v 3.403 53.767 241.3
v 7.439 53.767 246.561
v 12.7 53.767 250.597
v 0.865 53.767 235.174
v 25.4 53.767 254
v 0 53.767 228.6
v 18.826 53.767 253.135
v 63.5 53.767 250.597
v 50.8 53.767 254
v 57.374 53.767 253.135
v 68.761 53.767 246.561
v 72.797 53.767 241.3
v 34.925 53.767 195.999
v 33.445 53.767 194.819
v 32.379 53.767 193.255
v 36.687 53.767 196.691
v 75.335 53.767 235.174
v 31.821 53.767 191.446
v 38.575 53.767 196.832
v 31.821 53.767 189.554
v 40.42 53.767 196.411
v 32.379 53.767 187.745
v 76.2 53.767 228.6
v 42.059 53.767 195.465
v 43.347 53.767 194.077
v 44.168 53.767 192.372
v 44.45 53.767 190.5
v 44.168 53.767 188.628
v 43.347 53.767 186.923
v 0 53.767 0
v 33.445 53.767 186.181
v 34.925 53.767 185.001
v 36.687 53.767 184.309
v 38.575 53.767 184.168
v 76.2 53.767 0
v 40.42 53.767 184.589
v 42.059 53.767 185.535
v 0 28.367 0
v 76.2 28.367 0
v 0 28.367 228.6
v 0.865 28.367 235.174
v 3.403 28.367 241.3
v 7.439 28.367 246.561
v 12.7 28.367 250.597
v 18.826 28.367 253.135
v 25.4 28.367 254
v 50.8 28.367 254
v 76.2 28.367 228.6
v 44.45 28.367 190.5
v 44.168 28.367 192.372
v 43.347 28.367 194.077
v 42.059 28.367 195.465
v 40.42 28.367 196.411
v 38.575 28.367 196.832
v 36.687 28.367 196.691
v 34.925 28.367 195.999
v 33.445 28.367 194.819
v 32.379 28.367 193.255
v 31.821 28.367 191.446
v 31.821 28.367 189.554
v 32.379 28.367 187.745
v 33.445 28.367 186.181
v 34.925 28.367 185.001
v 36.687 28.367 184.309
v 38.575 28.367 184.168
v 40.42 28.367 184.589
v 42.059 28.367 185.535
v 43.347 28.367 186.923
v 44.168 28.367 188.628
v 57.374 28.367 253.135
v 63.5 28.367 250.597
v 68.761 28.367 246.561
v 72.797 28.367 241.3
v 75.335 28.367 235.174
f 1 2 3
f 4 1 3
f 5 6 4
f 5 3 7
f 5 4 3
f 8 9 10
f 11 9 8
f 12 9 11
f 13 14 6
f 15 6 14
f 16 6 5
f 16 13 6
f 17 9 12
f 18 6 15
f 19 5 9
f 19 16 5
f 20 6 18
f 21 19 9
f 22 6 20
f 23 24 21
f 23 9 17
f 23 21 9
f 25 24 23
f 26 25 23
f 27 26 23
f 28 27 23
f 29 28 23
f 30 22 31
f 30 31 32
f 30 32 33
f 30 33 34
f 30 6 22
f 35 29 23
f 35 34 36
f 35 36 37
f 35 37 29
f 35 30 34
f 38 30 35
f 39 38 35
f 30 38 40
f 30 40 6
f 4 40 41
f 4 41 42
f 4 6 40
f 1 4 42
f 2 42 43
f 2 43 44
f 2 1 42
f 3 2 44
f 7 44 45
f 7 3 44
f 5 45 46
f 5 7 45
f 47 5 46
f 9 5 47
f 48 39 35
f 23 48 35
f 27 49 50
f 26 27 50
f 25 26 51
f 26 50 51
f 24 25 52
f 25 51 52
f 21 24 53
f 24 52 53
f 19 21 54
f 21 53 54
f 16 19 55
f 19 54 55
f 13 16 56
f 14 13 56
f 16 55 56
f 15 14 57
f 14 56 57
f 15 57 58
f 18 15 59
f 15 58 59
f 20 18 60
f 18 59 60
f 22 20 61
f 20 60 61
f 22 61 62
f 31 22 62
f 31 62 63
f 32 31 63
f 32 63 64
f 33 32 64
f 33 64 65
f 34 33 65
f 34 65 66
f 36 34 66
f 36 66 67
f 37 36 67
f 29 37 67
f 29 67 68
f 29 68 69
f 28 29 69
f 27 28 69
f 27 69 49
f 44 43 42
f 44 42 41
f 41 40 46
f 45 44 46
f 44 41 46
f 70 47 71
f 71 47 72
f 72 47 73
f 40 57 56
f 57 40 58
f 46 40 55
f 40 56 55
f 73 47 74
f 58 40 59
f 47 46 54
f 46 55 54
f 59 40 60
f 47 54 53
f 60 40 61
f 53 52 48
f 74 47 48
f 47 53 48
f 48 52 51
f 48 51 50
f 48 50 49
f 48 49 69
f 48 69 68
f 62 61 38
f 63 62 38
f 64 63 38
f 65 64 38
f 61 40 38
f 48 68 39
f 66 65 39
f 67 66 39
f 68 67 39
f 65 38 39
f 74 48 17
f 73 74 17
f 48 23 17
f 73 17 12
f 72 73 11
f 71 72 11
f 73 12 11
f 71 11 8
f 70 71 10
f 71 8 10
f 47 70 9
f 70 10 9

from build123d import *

# Parameters (mm, degrees)
F0_W     = 76.2
F0_H     = 25.4
F1_DEPTH = 254
F2_R     = 25.4
F4_D     = 12.7


with BuildPart() as f1:
    # F0 (on Top) → F1 (new body)
    with BuildSketch(Plane.XY):
        with Locations((38.1, 41.066651)):
            Rectangle(F0_W, F0_H)
    extrude(amount=F1_DEPTH)

    # F2
    f2_edges = [f1.edges().sort_by_distance(p)[0] for p in [
        (0, 41.066651, 254),
        (76.2, 41.066651, 254),
    ]]
    fillet(f2_edges, radius=F2_R)

    # F4 (through all)
    with Locations(Plane(origin=(0, 53.766651, 0), x_dir=(-1, 0, 0), z_dir=(0, 1, 0))):
        with Locations((-38.1, 190.5)):
            Hole(F4_D / 2)


solid = f1.part
